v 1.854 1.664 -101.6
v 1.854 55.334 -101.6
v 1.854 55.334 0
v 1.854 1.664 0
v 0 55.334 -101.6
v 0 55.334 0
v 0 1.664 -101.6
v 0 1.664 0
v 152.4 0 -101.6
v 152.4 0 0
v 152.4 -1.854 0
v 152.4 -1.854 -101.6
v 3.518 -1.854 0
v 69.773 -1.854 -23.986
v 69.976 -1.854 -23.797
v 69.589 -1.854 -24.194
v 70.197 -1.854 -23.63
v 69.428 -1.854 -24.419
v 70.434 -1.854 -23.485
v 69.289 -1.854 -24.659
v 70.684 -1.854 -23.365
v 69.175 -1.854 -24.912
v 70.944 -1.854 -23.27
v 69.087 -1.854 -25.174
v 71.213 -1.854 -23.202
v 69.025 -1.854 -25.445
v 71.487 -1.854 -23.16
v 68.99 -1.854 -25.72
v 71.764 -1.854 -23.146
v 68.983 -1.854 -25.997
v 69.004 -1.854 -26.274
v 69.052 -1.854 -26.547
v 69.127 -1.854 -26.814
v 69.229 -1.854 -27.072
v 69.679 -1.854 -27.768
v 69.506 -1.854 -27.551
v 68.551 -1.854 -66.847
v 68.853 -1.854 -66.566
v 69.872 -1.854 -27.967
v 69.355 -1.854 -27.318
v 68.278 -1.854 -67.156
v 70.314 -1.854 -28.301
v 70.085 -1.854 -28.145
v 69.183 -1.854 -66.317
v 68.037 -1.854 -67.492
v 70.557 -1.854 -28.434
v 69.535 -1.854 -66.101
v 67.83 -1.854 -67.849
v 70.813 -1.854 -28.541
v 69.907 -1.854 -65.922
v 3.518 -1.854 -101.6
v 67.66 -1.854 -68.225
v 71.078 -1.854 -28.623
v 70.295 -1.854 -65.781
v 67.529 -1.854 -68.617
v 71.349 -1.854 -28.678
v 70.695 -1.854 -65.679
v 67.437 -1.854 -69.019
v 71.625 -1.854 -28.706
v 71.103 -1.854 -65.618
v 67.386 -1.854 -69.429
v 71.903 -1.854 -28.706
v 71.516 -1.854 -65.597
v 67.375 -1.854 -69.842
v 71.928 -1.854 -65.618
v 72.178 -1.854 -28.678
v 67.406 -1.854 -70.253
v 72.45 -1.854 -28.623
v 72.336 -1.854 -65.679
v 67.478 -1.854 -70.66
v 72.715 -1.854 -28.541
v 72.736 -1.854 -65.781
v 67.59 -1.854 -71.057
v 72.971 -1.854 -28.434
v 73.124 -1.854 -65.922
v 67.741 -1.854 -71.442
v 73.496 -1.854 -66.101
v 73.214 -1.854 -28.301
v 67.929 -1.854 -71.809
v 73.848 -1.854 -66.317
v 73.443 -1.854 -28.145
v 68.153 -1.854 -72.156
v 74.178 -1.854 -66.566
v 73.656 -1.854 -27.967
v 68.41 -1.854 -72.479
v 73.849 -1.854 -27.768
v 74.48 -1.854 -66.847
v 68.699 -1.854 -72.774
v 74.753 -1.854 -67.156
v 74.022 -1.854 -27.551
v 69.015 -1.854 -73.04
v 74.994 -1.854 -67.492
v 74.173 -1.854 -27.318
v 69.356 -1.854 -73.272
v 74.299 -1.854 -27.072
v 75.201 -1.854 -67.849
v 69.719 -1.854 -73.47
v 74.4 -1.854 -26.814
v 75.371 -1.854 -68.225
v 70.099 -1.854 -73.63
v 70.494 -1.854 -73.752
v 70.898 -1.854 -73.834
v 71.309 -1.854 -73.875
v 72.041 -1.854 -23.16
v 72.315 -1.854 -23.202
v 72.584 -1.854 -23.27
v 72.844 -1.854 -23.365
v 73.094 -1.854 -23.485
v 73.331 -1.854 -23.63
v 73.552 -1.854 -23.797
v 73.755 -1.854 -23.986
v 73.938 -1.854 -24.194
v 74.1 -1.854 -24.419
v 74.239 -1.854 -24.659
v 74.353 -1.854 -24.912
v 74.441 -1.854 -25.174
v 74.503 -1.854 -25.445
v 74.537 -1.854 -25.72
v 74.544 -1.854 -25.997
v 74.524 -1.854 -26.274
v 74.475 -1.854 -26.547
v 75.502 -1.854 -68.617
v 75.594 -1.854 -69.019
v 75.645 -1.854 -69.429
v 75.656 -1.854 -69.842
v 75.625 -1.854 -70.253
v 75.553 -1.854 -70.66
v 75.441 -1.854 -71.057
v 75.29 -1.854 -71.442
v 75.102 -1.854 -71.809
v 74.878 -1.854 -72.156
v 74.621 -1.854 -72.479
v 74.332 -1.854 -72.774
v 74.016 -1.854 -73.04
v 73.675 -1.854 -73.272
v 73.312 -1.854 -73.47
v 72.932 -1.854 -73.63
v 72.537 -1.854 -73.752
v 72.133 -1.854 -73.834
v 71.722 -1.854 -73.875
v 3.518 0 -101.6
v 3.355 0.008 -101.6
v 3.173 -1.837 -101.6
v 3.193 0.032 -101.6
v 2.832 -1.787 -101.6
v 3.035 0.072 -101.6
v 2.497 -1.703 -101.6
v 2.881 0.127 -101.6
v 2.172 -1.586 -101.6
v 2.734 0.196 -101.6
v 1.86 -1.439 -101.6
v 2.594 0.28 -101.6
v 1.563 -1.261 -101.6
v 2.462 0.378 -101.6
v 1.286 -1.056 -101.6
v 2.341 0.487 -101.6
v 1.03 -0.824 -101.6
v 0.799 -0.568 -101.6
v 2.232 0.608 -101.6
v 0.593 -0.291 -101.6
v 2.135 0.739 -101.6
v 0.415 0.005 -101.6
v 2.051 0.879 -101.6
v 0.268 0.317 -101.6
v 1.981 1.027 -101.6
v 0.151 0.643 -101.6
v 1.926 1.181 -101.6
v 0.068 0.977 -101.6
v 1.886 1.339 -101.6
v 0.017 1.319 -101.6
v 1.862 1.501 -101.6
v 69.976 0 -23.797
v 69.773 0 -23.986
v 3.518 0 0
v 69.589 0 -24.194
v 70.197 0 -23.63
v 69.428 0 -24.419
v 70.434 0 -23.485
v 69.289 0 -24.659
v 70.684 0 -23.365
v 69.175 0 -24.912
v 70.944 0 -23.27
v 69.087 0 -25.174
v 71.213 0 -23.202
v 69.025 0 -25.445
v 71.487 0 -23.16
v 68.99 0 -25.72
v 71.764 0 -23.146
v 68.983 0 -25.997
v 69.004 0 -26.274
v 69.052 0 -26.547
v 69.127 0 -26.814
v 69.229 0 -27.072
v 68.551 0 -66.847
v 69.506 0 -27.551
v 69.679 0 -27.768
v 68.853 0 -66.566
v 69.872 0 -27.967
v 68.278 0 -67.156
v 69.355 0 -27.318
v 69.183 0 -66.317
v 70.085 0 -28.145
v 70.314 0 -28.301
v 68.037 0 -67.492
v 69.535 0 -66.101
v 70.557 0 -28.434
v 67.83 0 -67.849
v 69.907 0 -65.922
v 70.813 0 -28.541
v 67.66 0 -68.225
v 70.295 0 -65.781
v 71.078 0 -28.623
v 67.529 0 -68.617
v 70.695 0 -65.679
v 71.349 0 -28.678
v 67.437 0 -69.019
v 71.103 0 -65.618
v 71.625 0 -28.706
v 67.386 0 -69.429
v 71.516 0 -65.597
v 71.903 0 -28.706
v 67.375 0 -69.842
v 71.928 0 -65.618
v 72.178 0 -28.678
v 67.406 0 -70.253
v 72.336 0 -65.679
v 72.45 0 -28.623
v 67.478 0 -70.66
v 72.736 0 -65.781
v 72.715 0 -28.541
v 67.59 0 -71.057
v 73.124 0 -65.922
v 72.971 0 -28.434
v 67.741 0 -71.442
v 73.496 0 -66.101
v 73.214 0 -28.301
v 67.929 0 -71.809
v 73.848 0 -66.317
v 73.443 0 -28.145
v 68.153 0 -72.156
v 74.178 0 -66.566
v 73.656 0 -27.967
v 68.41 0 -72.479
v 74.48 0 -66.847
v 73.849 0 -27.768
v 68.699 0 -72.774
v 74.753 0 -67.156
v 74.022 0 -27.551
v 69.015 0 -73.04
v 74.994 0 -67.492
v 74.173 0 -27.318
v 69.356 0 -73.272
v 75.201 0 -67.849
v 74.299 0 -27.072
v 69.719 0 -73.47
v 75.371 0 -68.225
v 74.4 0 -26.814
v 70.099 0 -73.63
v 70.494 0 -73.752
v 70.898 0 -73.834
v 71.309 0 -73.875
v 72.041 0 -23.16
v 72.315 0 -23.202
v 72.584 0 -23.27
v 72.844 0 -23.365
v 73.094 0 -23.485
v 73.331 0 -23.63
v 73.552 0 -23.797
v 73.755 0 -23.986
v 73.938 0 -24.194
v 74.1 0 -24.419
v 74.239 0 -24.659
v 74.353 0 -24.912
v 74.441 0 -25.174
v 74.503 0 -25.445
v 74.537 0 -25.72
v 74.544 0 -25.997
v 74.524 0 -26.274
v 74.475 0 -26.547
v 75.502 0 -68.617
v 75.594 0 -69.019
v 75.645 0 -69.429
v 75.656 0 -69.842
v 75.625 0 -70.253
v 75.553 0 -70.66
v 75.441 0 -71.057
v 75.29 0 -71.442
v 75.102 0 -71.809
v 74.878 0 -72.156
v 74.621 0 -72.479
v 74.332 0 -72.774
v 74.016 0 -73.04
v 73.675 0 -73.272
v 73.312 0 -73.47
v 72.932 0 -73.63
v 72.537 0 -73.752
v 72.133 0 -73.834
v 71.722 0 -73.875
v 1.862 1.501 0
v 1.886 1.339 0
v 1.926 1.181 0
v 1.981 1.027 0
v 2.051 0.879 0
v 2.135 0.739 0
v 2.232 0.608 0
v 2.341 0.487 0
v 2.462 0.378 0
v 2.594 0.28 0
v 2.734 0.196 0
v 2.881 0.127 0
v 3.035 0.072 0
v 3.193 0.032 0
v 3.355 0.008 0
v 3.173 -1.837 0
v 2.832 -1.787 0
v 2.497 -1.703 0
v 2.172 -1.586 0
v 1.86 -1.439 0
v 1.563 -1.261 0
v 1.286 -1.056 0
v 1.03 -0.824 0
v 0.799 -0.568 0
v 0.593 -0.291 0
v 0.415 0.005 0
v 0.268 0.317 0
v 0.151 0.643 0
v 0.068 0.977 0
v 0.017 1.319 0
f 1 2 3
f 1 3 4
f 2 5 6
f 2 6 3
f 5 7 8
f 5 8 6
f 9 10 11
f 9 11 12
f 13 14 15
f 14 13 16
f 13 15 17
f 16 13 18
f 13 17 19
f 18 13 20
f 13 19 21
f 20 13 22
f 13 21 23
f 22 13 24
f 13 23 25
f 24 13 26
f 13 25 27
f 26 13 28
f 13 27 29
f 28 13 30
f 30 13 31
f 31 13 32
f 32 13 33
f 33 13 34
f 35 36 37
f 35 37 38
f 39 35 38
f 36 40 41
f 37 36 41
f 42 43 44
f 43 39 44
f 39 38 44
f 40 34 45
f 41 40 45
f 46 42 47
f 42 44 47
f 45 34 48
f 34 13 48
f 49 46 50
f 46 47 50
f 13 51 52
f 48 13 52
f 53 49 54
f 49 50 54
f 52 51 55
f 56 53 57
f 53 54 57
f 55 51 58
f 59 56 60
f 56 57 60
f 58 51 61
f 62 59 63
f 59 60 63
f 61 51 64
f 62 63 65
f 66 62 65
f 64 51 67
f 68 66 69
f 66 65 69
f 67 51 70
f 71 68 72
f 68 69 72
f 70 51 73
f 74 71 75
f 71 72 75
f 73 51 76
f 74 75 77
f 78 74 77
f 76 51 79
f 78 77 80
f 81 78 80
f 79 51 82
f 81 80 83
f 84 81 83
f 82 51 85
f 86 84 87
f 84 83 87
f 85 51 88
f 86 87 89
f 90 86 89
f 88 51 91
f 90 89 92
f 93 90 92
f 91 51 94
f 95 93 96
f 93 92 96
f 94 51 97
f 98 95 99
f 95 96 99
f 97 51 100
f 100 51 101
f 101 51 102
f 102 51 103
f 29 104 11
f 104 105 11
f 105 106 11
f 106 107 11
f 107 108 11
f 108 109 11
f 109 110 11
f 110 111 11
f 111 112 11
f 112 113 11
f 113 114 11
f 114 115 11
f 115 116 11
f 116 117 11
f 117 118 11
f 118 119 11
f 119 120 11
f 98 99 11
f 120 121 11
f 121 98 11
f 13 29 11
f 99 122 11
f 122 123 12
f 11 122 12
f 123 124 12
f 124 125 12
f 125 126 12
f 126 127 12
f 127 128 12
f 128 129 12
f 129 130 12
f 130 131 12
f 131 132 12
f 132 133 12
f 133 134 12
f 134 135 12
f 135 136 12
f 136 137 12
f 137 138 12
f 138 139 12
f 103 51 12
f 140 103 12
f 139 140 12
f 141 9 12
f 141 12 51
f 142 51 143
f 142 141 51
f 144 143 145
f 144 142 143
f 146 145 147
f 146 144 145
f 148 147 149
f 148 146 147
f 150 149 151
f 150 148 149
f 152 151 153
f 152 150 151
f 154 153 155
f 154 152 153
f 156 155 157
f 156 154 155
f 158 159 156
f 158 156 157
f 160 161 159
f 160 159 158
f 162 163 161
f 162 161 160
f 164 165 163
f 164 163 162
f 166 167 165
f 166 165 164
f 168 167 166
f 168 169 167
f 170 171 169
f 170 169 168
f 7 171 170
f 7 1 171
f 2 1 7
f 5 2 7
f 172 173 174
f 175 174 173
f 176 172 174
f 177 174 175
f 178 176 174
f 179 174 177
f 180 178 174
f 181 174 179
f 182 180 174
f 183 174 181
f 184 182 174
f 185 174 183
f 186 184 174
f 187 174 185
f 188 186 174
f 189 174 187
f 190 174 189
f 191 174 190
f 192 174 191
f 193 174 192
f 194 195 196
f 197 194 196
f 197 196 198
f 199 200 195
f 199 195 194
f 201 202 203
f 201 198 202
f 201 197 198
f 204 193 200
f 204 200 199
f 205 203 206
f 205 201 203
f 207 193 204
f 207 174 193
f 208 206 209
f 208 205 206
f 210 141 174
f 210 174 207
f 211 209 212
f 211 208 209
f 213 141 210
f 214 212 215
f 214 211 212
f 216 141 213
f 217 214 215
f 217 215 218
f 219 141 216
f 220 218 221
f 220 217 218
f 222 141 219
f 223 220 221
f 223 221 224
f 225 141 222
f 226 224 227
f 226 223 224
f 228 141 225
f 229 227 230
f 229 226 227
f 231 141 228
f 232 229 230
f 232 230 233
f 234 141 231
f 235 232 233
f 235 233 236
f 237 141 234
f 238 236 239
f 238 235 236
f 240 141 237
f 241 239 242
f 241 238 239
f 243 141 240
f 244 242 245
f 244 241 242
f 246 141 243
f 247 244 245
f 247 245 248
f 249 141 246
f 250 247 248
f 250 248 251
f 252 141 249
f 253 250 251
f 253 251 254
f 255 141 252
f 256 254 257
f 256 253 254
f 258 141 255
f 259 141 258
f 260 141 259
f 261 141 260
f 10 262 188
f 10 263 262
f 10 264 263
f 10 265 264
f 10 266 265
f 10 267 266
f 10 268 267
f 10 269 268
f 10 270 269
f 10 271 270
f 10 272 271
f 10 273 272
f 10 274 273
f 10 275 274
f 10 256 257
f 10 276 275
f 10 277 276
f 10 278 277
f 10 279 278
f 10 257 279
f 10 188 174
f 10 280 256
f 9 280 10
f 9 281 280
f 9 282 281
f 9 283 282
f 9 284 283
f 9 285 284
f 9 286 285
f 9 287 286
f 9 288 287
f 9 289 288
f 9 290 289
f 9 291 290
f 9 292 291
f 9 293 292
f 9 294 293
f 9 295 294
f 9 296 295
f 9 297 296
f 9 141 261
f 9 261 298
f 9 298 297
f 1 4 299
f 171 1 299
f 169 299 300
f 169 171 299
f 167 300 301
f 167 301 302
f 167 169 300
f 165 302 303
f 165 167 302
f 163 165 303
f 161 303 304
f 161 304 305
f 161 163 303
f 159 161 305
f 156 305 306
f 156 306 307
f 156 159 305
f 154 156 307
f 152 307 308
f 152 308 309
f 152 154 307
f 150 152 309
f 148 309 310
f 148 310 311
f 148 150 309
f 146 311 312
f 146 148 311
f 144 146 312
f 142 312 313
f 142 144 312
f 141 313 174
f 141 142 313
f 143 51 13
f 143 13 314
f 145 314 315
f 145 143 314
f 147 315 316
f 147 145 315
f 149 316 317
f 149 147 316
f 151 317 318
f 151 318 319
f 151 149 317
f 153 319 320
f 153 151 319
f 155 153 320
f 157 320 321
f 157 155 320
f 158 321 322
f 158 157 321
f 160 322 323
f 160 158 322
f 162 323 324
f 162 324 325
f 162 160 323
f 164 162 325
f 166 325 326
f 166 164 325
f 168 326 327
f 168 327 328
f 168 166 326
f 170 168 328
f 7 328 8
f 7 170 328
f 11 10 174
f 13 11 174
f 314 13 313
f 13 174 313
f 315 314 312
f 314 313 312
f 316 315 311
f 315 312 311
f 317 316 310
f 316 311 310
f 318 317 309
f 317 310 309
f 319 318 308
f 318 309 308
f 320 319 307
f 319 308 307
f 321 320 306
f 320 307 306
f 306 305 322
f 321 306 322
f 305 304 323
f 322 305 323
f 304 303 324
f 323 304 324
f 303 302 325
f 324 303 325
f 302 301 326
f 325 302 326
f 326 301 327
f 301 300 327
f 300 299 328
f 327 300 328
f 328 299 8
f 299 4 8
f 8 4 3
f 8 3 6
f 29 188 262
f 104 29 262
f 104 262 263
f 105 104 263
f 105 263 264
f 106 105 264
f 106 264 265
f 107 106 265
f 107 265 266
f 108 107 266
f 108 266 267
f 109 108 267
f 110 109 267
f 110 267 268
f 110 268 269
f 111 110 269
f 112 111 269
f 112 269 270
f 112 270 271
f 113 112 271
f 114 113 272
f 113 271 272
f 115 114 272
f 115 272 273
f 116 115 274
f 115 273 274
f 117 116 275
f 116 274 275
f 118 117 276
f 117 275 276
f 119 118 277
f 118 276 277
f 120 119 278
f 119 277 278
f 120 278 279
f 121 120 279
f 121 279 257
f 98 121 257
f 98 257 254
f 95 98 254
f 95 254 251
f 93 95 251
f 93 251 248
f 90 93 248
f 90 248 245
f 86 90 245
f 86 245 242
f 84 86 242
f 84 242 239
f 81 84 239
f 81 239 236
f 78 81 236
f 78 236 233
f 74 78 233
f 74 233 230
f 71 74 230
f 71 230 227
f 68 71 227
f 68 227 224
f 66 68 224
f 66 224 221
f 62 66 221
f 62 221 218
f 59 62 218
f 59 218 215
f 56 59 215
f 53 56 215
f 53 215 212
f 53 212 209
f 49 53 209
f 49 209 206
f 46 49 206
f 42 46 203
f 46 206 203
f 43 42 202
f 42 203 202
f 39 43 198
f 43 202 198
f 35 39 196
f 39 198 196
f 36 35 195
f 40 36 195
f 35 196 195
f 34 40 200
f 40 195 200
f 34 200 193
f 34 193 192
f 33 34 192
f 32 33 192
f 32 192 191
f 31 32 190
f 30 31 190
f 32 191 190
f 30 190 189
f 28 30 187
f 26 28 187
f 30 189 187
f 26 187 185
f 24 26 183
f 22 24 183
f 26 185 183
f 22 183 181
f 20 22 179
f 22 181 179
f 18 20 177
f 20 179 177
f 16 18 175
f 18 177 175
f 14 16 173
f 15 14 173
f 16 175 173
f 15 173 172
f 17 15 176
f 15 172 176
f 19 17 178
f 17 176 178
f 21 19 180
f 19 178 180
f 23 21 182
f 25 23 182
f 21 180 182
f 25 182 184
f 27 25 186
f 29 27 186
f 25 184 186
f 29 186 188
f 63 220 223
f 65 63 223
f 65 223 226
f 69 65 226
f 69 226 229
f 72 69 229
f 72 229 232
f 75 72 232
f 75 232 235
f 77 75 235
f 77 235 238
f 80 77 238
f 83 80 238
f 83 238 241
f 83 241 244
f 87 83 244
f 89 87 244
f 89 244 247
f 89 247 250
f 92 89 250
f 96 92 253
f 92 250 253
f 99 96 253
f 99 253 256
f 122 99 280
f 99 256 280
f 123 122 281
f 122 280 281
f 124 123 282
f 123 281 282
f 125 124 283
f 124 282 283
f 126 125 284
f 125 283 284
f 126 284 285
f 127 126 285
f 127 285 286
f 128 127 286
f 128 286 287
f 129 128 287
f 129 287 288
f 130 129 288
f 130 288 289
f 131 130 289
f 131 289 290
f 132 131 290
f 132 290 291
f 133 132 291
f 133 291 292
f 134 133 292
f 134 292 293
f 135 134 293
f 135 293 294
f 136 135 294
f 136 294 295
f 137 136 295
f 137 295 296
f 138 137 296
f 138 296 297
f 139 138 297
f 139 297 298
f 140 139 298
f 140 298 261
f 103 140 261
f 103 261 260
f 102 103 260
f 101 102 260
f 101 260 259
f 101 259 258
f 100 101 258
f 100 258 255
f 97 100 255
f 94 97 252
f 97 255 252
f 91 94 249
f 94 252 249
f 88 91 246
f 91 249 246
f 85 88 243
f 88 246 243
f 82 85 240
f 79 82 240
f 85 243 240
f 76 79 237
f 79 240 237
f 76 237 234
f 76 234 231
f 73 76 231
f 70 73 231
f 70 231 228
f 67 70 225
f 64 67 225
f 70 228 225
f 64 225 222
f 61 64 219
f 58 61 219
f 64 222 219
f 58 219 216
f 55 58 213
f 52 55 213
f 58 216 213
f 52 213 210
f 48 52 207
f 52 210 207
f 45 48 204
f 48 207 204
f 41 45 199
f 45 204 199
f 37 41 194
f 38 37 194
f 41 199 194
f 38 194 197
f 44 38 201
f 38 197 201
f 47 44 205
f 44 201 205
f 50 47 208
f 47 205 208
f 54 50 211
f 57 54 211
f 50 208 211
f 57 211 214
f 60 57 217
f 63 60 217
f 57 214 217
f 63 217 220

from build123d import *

# Parameters (mm, degrees)
SKETCH1_W                    = 152.4
SKETCH1_H                    = 101.6
BASE_FLANGE1_DEPTH           = 1.8542
EDGE_FLANGE1_STRIP_W         = 10.7442
EDGE_FLANGE1_STRIP_H         = 1.8542
EDGE_FLANGE1_STRIP_CUT_DEPTH = 101.6
EDGE_FLANGE1_DEPTH           = 101.6
SKETCH14_R                   = 2.7813
TAP_1_4_20_HOLE1_DEPTH       = 2.54
SKETCH15_R                   = 4.1413765
TAPPED_3_8_16_HOLE2_DEPTH    = 2.54


# Sheet-metal steps are written as plain solids
with BuildPart() as part:
    # Sketch1 → Base-Flange1 (new body)
    with BuildSketch(Plane(origin=(0, 0, 0), x_dir=(1, 0, 0), z_dir=(0, 1, 0))):
        with Locations((76.2, 50.8)):
            Rectangle(SKETCH1_W, SKETCH1_H)
    extrude(amount=-BASE_FLANGE1_DEPTH)

    # Edge-Flange1 strip (across the edge) → Edge-Flange1 strip cut (cut)
    with BuildSketch(Plane.XY.offset(-101.6)):
        with Locations((-1.8542, -0.9271)):
            Rectangle(EDGE_FLANGE1_STRIP_W, EDGE_FLANGE1_STRIP_H)
    extrude(amount=EDGE_FLANGE1_STRIP_CUT_DEPTH, mode=Mode.SUBTRACT)

    # Edge-Flange1 section (across the edge) → Edge-Flange1 (add)
    with BuildSketch(Plane.XY.offset(-101.6)):
        with BuildLine():
            Line((0, 1.6637), (0, 55.3339))
            Line((0, 55.3339), (1.8542, 55.3339))
            Line((1.8542, 55.3339), (1.8542, 1.6637))
            ThreePointArc((1.8542, 1.6637), (2.341486448, 0.487286448), (3.5179, 0))
            Line((3.5179, 0), (3.5179, -1.8542))
            ThreePointArc((3.5179, -1.8542), (1.030369054, -0.823830946), (0, 1.6637))
        make_face()
    extrude(amount=EDGE_FLANGE1_DEPTH)

    # Sketch14 → TAP 1/4-20 Hole1 (cut)
    with BuildSketch(Plane(origin=(0, 0, 0), x_dir=(1, 0, 0), z_dir=(0, 1, 0))):
        with Locations(Location((71.763910774, 25.92775269, 0), (0, 0, 270))):
            Circle(SKETCH14_R)
    extrude(amount=-TAP_1_4_20_HOLE1_DEPTH, mode=Mode.SUBTRACT)

    # Sketch15 → TAPPED 3/8-16 Hole2 (cut)
    with BuildSketch(Plane(origin=(0, 0, 0), x_dir=(1, 0, 0), z_dir=(0, 1, 0))):
        with Locations(Location((71.515516592, 69.738450307, 0), (0, 0, 270))):
            Circle(SKETCH15_R)
    extrude(amount=-TAPPED_3_8_16_HOLE2_DEPTH, mode=Mode.SUBTRACT)


solid = part.part
